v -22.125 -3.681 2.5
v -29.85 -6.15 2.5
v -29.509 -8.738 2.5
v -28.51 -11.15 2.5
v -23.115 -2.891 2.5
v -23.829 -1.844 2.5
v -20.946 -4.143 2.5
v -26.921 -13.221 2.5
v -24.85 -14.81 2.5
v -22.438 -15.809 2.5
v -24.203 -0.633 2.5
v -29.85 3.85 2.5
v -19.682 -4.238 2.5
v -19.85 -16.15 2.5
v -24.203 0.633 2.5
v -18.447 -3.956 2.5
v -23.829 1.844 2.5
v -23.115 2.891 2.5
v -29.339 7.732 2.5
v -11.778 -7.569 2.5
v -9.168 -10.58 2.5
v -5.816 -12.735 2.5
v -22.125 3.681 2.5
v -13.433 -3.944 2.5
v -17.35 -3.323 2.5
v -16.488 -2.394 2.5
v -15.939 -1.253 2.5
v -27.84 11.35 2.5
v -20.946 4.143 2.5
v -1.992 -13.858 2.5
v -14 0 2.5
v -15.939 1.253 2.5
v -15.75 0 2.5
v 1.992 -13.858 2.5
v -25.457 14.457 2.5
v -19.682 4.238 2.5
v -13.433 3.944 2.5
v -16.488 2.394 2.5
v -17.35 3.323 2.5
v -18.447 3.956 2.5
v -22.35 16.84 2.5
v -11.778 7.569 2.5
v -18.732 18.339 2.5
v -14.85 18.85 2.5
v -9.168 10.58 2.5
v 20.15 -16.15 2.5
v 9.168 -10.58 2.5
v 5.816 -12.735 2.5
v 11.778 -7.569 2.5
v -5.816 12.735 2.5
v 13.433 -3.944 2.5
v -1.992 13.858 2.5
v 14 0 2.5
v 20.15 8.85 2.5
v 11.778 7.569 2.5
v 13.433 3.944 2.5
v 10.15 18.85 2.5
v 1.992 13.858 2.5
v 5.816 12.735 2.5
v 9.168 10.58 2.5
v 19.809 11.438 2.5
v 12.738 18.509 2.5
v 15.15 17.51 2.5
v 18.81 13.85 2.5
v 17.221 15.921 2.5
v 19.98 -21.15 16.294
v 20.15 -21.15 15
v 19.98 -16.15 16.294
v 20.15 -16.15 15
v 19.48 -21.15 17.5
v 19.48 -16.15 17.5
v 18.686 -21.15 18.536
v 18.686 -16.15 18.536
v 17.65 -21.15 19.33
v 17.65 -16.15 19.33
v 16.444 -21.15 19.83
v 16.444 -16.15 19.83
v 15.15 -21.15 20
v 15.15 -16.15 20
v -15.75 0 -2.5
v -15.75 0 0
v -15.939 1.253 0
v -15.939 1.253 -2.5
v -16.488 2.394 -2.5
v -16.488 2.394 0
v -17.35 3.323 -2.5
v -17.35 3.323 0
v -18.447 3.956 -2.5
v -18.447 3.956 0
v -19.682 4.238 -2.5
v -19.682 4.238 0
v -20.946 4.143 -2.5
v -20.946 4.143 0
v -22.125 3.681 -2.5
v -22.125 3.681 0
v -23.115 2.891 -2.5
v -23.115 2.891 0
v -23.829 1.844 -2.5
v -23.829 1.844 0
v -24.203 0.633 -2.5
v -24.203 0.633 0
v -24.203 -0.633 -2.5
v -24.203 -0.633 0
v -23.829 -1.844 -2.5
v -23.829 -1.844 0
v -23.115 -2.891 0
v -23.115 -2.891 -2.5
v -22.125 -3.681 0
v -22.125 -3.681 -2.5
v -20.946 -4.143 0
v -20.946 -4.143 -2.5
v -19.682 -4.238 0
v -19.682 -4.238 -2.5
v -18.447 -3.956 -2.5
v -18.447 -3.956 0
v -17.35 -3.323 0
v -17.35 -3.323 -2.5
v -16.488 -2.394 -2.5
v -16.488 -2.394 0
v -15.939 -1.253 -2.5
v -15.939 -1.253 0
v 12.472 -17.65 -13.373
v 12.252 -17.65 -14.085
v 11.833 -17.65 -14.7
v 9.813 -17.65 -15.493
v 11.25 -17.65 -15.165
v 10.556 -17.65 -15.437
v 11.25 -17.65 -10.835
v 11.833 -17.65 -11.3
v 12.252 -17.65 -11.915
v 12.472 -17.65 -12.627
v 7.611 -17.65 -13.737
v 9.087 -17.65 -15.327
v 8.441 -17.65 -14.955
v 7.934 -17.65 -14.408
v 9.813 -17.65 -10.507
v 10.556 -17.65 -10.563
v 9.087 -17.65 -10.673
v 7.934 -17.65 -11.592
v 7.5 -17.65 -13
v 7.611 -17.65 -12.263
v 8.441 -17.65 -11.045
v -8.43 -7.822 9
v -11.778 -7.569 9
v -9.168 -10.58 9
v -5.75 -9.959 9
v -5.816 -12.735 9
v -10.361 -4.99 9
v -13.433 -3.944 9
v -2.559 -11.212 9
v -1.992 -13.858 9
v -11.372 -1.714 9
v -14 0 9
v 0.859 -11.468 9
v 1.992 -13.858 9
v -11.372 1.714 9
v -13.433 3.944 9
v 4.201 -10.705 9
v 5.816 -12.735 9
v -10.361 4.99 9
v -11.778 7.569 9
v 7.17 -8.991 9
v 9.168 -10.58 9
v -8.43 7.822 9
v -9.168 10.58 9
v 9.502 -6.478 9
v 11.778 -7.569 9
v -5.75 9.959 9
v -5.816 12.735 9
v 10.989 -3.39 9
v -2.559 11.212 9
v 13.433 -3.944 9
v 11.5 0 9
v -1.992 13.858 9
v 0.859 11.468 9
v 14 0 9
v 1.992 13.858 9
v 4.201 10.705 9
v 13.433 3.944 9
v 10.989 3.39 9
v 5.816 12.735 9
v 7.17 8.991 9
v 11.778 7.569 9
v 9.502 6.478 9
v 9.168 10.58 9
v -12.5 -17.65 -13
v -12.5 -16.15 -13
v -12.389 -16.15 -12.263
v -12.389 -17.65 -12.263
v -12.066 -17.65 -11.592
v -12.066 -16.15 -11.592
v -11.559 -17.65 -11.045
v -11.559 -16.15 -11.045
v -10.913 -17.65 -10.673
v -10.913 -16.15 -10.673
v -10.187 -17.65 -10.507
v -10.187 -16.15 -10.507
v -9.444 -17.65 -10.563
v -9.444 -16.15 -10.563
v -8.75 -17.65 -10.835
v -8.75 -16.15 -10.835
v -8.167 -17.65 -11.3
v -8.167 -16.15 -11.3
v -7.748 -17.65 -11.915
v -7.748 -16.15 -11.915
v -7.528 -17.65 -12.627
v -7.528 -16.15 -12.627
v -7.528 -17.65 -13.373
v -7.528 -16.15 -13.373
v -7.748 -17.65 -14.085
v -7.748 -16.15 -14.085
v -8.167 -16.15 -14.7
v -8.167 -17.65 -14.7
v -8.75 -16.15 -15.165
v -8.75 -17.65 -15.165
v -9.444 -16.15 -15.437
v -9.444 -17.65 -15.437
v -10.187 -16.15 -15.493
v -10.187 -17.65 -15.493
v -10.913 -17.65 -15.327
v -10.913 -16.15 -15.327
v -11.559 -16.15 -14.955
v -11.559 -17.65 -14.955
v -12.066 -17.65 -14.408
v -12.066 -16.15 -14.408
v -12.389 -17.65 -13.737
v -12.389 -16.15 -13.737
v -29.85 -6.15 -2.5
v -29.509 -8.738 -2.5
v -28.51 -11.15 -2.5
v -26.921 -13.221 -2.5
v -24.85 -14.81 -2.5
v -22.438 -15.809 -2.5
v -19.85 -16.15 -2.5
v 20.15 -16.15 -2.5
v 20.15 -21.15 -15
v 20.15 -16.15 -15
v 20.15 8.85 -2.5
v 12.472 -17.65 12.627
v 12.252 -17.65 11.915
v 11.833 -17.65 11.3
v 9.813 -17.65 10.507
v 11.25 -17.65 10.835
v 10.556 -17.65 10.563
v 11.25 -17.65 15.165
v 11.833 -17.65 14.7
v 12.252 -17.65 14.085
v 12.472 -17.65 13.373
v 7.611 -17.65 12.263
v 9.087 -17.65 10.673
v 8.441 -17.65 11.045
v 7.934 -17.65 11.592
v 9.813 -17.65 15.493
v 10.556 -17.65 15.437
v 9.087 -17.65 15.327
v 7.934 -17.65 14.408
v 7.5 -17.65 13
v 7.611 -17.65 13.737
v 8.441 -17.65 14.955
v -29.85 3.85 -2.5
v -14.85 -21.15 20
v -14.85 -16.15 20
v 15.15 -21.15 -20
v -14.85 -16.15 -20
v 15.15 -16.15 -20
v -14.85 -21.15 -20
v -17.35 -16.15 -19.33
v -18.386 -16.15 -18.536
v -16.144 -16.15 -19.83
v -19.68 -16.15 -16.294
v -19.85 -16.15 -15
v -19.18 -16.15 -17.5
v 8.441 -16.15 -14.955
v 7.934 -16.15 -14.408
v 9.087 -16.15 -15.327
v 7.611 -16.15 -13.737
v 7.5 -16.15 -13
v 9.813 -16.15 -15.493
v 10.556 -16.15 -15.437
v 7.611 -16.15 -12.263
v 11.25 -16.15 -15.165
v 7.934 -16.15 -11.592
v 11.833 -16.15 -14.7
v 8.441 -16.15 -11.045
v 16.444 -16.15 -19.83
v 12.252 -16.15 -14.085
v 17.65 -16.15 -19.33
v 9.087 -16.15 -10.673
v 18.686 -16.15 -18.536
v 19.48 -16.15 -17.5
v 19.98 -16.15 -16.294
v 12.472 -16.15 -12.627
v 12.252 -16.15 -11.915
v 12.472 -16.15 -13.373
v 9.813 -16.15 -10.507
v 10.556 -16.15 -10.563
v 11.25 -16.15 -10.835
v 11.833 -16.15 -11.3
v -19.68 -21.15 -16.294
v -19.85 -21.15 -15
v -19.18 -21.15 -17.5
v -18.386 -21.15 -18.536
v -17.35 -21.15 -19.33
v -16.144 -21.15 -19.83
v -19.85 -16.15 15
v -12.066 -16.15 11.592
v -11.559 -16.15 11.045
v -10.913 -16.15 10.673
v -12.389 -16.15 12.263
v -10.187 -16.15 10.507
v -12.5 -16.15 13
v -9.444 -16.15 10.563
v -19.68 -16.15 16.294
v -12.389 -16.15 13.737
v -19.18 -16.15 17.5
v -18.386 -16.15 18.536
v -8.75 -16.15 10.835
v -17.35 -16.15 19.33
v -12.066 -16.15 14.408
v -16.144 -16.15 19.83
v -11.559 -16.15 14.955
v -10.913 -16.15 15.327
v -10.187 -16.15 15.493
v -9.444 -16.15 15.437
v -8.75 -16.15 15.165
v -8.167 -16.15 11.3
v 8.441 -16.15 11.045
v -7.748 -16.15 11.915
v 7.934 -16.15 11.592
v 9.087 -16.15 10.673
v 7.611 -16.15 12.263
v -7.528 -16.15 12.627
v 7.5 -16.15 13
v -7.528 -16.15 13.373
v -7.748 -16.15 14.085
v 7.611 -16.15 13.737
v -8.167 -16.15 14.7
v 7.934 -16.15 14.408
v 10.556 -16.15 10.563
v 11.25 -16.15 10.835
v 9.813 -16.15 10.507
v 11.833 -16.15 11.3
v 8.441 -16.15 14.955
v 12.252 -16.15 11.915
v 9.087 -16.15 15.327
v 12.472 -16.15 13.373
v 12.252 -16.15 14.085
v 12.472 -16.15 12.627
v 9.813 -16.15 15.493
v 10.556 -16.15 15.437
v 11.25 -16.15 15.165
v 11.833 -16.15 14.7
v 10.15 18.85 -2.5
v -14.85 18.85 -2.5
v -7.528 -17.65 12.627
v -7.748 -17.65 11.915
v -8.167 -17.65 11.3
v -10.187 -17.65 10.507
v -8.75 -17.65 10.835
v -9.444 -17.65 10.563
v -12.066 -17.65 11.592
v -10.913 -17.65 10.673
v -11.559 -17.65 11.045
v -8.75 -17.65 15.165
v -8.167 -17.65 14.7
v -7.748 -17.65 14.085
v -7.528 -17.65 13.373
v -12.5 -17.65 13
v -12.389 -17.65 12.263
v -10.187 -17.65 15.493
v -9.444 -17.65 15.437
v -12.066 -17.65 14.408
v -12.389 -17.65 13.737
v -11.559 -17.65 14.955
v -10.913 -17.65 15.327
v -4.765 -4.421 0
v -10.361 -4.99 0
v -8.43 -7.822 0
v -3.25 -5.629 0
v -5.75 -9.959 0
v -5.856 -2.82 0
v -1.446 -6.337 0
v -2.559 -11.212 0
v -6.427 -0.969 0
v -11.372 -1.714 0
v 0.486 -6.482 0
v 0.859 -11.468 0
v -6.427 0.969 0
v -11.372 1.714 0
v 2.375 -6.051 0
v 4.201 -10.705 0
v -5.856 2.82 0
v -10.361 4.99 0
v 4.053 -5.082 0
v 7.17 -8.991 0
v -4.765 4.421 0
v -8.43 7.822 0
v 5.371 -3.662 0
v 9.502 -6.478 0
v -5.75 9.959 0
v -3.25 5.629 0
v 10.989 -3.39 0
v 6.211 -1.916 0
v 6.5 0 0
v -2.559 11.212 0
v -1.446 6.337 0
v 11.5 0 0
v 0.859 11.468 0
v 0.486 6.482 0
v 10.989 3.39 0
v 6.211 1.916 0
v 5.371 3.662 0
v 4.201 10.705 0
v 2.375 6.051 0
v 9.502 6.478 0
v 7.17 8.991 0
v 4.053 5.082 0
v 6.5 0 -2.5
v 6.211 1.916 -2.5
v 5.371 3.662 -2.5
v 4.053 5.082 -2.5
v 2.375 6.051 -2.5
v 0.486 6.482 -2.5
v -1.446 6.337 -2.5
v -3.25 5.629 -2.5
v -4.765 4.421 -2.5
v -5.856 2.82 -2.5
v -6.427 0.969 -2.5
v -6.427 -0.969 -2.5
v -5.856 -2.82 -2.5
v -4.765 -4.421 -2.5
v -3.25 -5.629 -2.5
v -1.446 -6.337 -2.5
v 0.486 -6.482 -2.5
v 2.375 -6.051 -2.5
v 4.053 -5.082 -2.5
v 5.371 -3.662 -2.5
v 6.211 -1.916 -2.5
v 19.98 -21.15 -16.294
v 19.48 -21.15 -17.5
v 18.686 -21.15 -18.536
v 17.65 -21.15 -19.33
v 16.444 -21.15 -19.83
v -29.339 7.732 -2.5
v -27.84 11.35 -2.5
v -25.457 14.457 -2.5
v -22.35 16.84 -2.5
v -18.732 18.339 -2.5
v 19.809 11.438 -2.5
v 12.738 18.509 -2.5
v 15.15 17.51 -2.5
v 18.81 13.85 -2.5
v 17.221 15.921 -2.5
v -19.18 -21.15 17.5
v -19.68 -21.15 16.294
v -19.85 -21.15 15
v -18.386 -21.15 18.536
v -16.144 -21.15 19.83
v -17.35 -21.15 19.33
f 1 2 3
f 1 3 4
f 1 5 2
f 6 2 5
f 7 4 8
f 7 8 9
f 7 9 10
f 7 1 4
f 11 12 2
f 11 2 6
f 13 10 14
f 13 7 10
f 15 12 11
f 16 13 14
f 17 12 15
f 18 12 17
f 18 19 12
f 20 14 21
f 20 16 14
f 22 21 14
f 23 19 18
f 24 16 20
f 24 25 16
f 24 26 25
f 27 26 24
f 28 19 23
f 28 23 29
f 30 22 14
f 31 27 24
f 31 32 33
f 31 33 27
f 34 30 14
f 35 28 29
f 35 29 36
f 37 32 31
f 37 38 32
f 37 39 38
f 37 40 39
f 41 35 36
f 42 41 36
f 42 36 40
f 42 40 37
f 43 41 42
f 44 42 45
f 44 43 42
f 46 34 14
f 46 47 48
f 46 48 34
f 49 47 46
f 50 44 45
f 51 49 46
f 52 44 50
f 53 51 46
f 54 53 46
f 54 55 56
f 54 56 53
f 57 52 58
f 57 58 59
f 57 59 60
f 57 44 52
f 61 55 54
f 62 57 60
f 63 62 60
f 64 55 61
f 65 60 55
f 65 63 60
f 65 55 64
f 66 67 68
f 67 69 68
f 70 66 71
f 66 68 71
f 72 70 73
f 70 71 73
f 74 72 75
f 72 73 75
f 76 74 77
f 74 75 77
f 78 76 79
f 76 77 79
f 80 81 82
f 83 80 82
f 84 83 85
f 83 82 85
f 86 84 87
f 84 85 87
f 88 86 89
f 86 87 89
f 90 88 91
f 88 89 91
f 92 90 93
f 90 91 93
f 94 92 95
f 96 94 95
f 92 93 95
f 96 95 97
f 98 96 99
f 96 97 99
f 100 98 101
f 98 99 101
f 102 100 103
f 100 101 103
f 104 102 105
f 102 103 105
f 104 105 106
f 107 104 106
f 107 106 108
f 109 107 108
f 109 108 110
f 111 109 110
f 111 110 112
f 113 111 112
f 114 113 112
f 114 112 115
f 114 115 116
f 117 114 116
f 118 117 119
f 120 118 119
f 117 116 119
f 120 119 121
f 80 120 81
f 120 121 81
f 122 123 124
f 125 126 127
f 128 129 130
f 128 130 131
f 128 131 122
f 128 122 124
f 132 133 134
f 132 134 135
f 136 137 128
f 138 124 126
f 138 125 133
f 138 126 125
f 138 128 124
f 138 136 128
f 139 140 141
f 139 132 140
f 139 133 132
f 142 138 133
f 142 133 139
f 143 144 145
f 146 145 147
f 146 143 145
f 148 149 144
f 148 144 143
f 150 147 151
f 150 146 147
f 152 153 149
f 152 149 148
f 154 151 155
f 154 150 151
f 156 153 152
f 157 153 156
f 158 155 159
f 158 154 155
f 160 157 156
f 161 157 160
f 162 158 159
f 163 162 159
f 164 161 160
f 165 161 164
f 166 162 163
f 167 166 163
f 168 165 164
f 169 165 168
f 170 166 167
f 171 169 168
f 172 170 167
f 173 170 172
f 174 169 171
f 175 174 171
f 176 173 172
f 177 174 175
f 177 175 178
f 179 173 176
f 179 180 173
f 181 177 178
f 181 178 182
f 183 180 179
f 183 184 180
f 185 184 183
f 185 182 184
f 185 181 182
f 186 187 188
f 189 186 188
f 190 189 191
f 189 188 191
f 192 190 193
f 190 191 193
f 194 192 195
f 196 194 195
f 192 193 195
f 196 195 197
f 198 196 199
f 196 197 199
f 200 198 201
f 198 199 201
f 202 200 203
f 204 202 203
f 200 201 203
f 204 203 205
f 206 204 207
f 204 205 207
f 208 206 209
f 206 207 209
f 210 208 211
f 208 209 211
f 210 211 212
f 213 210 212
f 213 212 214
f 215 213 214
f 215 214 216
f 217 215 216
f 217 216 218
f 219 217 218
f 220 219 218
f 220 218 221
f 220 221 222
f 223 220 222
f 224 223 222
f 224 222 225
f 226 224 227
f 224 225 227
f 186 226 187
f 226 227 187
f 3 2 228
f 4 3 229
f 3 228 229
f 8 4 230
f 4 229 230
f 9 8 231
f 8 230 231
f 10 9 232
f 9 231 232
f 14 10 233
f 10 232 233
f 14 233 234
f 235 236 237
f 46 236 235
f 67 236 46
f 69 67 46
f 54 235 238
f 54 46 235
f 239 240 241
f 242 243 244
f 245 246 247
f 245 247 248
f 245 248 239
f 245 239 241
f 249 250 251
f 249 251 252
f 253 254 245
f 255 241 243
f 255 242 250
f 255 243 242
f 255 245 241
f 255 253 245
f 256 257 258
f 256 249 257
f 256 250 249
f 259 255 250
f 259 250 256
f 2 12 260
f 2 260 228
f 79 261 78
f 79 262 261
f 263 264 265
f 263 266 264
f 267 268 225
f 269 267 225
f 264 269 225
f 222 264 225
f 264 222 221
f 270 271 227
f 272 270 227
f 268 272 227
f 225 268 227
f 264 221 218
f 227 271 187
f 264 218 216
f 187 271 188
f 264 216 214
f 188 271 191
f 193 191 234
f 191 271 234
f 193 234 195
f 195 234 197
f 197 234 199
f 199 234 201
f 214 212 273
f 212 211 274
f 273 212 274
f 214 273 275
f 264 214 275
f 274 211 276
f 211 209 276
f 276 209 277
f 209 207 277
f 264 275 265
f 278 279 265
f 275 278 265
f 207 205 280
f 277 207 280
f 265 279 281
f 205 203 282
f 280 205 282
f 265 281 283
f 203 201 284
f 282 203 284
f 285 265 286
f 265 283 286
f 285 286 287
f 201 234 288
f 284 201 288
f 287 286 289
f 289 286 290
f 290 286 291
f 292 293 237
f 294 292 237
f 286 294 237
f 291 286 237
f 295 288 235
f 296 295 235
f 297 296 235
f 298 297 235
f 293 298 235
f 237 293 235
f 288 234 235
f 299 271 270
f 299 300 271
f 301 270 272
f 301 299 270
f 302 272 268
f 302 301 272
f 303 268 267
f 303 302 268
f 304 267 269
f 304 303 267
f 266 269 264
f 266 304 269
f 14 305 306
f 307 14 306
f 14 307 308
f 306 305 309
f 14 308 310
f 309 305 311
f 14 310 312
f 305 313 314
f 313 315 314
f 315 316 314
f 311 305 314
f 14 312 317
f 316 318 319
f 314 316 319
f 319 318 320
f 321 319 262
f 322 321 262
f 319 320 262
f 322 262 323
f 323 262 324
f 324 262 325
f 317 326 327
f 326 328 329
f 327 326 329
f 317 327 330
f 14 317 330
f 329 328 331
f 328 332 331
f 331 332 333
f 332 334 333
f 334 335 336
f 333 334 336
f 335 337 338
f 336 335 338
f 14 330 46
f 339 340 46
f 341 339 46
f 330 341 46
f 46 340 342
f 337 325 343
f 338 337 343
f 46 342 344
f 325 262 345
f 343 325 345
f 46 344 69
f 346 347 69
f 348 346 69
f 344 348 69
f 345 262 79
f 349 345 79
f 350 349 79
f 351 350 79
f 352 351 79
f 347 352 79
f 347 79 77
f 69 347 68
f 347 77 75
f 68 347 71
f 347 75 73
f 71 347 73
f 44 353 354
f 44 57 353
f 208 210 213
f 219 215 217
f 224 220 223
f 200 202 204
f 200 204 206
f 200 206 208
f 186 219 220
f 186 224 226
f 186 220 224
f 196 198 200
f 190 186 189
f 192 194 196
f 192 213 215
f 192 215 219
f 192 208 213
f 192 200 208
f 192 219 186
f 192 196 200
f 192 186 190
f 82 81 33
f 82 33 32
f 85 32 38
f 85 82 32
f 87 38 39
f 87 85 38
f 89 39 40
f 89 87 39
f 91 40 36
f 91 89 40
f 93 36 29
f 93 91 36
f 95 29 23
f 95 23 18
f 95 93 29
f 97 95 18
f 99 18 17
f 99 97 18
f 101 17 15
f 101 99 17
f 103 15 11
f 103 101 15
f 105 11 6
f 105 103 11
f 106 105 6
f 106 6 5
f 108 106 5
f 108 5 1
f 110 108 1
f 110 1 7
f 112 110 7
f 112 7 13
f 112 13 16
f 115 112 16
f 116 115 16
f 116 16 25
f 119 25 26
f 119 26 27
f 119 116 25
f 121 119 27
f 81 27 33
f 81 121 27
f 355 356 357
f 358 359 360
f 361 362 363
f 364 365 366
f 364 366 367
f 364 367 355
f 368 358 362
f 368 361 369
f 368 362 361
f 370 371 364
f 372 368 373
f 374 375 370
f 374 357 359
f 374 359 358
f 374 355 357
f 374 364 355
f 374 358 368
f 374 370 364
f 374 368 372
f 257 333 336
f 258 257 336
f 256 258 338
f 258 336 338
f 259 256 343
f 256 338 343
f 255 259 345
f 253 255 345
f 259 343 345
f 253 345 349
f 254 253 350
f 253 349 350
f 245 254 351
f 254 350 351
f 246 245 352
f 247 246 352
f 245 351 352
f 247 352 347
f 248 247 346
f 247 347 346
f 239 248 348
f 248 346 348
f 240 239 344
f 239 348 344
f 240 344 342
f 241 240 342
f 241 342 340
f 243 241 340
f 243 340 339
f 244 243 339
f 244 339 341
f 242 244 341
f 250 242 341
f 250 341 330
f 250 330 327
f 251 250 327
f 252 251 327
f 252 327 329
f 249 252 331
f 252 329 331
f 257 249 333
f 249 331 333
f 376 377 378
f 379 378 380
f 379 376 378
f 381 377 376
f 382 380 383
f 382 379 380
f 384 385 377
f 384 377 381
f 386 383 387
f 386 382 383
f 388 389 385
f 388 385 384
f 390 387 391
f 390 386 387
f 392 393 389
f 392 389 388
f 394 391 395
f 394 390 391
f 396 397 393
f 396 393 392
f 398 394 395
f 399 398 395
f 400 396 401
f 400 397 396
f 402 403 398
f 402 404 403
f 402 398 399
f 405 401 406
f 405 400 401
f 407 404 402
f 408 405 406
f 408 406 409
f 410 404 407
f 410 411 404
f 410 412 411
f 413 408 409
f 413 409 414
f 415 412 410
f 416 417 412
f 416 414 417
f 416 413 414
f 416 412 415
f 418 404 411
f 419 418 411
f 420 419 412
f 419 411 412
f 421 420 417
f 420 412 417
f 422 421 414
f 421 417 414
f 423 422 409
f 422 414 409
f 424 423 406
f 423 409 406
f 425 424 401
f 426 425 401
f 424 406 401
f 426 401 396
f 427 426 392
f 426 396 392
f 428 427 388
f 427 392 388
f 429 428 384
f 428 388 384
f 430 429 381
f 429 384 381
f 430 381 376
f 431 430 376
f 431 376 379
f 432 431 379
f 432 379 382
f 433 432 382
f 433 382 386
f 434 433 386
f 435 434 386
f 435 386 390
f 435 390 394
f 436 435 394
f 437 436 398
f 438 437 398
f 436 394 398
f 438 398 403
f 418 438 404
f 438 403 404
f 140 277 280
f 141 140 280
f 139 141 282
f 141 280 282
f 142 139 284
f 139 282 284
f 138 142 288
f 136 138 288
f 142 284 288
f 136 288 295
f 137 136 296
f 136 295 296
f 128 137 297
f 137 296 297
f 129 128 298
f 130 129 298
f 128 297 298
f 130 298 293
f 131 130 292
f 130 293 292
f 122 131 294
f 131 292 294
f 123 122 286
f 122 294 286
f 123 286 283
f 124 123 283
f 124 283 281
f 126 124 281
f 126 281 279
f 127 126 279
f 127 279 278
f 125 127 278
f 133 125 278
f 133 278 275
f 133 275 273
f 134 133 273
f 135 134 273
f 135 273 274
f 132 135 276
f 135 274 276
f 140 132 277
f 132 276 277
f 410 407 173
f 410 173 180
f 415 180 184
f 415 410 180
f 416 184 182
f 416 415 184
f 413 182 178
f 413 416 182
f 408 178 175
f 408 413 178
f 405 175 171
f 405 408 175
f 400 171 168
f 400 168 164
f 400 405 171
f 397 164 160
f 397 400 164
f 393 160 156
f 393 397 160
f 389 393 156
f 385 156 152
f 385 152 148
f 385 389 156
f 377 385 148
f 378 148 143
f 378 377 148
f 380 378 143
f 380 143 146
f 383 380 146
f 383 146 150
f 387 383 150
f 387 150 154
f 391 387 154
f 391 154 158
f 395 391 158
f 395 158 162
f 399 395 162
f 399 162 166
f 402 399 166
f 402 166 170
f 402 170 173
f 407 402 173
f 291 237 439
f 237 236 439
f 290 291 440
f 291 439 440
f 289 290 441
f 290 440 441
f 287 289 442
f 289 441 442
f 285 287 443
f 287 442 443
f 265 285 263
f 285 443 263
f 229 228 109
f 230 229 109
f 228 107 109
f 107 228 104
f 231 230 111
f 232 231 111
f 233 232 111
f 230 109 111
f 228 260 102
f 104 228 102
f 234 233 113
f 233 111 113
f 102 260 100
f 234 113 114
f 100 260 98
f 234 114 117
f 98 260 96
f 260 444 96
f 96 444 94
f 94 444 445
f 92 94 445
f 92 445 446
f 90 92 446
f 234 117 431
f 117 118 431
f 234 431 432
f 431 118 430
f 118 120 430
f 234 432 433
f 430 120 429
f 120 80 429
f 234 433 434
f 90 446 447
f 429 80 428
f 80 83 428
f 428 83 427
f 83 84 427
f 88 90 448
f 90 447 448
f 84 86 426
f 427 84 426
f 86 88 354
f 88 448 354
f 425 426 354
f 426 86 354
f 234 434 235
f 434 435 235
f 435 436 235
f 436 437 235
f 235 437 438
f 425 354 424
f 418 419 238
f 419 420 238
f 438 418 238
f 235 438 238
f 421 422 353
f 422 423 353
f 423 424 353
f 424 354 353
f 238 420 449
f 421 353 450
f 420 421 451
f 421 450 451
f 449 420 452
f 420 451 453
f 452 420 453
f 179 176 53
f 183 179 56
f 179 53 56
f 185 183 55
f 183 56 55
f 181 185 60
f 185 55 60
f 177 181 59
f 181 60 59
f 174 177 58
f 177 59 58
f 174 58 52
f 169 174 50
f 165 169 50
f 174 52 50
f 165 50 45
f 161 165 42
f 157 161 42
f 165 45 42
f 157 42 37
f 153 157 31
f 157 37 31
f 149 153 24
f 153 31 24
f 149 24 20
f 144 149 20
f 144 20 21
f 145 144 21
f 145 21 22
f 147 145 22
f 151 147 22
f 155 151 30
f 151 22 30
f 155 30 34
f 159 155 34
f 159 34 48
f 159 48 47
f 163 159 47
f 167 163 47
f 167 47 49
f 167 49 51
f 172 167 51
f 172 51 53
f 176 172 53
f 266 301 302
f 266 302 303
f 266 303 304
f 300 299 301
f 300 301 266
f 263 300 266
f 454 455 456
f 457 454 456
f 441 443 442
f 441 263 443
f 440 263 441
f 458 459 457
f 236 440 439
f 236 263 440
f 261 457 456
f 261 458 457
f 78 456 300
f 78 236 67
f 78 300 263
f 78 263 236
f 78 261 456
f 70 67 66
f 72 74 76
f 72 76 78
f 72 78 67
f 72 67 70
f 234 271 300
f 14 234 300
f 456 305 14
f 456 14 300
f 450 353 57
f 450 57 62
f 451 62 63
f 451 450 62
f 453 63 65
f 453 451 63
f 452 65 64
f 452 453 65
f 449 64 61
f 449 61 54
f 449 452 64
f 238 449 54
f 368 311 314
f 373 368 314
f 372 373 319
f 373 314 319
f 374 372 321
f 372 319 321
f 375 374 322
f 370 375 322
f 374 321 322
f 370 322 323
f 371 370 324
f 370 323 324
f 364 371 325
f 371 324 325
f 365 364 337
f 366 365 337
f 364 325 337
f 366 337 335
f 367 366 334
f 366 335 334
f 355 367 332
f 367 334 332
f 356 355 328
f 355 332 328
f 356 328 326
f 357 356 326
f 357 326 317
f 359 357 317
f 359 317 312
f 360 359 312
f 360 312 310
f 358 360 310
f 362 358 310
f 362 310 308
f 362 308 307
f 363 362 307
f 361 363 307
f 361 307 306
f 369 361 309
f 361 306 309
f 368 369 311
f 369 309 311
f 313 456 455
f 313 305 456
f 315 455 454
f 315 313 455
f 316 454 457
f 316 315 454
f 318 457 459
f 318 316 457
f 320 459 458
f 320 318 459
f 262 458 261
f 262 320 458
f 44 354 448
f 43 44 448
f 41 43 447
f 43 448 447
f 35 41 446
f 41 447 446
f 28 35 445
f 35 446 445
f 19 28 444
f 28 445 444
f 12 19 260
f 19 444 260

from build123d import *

# Parameters (mm, degrees)
F0_W      = 20
F0_H      = 5
F1_DEPTH  = 20
F1_FACE_W = 40
F1_FACE_H = 5
F2_DEPTH  = 20
F0_R      = 14
F0_R_2    = 11.5
F3_DEPTH  = 9
F0_R_3    = 4.25
F4_DEPTH  = 2.5
F0_R_4    = 6.5
F5_DEPTH  = 2.5
F6_R      = 15
F6_2_R    = 15
F7_R      = 10
F7_2_R    = 10
F8_R      = 10
F8_2_R    = 10
F9_R      = 5
F11_R     = 2.5
F12_DEPTH = 1.5


with BuildPart() as f1:
    # F0 (on Top) → F1 (new body)
    with BuildSketch(Plane.XY):
        with Locations((-9.850006, -18.65)):
            Rectangle(F0_W, F0_H)
        with Locations((10.149994, -18.65)):
            Rectangle(F0_W, F0_H)
    extrude(amount=F1_DEPTH)

    # F1_face (on face) → F2 (join)
    with BuildSketch(Plane(origin=(0.149994, -18.65, 0), x_dir=(1, 0, 0), z_dir=(0, 0, -1))):
        Rectangle(F1_FACE_W, F1_FACE_H)
    extrude(amount=F2_DEPTH)

    # F9
    f9_edges = [f1.edges().sort_by_distance(p)[0] for p in [
        (-19.850006, -18.65, 20),
        (20.149994, -18.65, 20),
        (20.149994, -18.65, -20),
        (-19.850006, -18.65, -20),
    ]]
    fillet(f9_edges, radius=F9_R)


with BuildPart() as f3:
    # F0 (on Top) → F3 (new body)
    with BuildSketch(Plane.XY):
        Circle(F0_R)
        Circle(F0_R_2, mode=Mode.SUBTRACT)
    extrude(amount=F3_DEPTH)


with BuildPart() as f4:
    # F0 (on Top) → F4 (new body)
    with BuildSketch(Plane.XY):
        Polygon((-19.850006, -16.15), (0.149994, -16.15), (20.149994, -16.15), (20.149994, 18.85), (-29.850006, 18.85), (-29.850006, -16.15), align=None)
        with Locations((-20, 0)):
            Circle(F0_R_3, mode=Mode.SUBTRACT)
        Circle(F0_R, mode=Mode.SUBTRACT)
        Circle(F0_R)
        Circle(F0_R_2, mode=Mode.SUBTRACT)
    extrude(amount=F4_DEPTH)

    # F6#2
    f6_2_edges = [f4.edges().sort_by_distance(p)[0] for p in [
        (-29.850006, 18.85, 1.25),
    ]]
    fillet(f6_2_edges, radius=F6_2_R)

    # F7#2
    f7_2_edges = [f4.edges().sort_by_distance(p)[0] for p in [
        (20.149994, 18.85, 1.25),
    ]]
    fillet(f7_2_edges, radius=F7_2_R)

    # F8#2
    f8_2_edges = [f4.edges().sort_by_distance(p)[0] for p in [
        (-29.850006, -16.15, 1.25),
    ]]
    fillet(f8_2_edges, radius=F8_2_R)


with BuildPart() as f5:
    # F0 (on Top) → F5 (new body)
    with BuildSketch(Plane.XY):
        Polygon((-19.850006, -16.15), (0.149994, -16.15), (20.149994, -16.15), (20.149994, 18.85), (-29.850006, 18.85), (-29.850006, -16.15), align=None)
        with Locations((-20, 0)):
            Circle(F0_R_3, mode=Mode.SUBTRACT)
        Circle(F0_R, mode=Mode.SUBTRACT)
        Circle(F0_R)
        Circle(F0_R_2, mode=Mode.SUBTRACT)
        Circle(F0_R_2)
        Circle(F0_R_4, mode=Mode.SUBTRACT)
    extrude(amount=-F5_DEPTH)

    # F6
    f6_edges = [f5.edges().sort_by_distance(p)[0] for p in [
        (-29.850006, 18.85, -1.25),
    ]]
    fillet(f6_edges, radius=F6_R)

    # F7
    f7_edges = [f5.edges().sort_by_distance(p)[0] for p in [
        (20.149994, 18.85, -1.25),
    ]]
    fillet(f7_edges, radius=F7_R)

    # F8
    f8_edges = [f5.edges().sort_by_distance(p)[0] for p in [
        (-29.850006, -16.15, -1.25),
    ]]
    fillet(f8_edges, radius=F8_R)


with BuildPart() as f1_1:
    add(f1.part)

    # F10: union F3, F4, F5
    add(f3.part)
    add(f4.part)
    add(f5.part)

    # F11 (on face) → F12 (cut)
    with BuildSketch(Plane(origin=(0, -16.15, 0), x_dir=(-1, 0, 0), z_dir=(0, 1, 0))):
        with Locations((-10, 13)):
            Circle(F11_R)
        with Locations((10, 13)):
            Circle(F11_R)
        with Locations((-10, -13)):
            Circle(F11_R)
        with Locations((10, -13)):
            Circle(F11_R)
    extrude(amount=-F12_DEPTH, mode=Mode.SUBTRACT)


solid = f1_1.part
